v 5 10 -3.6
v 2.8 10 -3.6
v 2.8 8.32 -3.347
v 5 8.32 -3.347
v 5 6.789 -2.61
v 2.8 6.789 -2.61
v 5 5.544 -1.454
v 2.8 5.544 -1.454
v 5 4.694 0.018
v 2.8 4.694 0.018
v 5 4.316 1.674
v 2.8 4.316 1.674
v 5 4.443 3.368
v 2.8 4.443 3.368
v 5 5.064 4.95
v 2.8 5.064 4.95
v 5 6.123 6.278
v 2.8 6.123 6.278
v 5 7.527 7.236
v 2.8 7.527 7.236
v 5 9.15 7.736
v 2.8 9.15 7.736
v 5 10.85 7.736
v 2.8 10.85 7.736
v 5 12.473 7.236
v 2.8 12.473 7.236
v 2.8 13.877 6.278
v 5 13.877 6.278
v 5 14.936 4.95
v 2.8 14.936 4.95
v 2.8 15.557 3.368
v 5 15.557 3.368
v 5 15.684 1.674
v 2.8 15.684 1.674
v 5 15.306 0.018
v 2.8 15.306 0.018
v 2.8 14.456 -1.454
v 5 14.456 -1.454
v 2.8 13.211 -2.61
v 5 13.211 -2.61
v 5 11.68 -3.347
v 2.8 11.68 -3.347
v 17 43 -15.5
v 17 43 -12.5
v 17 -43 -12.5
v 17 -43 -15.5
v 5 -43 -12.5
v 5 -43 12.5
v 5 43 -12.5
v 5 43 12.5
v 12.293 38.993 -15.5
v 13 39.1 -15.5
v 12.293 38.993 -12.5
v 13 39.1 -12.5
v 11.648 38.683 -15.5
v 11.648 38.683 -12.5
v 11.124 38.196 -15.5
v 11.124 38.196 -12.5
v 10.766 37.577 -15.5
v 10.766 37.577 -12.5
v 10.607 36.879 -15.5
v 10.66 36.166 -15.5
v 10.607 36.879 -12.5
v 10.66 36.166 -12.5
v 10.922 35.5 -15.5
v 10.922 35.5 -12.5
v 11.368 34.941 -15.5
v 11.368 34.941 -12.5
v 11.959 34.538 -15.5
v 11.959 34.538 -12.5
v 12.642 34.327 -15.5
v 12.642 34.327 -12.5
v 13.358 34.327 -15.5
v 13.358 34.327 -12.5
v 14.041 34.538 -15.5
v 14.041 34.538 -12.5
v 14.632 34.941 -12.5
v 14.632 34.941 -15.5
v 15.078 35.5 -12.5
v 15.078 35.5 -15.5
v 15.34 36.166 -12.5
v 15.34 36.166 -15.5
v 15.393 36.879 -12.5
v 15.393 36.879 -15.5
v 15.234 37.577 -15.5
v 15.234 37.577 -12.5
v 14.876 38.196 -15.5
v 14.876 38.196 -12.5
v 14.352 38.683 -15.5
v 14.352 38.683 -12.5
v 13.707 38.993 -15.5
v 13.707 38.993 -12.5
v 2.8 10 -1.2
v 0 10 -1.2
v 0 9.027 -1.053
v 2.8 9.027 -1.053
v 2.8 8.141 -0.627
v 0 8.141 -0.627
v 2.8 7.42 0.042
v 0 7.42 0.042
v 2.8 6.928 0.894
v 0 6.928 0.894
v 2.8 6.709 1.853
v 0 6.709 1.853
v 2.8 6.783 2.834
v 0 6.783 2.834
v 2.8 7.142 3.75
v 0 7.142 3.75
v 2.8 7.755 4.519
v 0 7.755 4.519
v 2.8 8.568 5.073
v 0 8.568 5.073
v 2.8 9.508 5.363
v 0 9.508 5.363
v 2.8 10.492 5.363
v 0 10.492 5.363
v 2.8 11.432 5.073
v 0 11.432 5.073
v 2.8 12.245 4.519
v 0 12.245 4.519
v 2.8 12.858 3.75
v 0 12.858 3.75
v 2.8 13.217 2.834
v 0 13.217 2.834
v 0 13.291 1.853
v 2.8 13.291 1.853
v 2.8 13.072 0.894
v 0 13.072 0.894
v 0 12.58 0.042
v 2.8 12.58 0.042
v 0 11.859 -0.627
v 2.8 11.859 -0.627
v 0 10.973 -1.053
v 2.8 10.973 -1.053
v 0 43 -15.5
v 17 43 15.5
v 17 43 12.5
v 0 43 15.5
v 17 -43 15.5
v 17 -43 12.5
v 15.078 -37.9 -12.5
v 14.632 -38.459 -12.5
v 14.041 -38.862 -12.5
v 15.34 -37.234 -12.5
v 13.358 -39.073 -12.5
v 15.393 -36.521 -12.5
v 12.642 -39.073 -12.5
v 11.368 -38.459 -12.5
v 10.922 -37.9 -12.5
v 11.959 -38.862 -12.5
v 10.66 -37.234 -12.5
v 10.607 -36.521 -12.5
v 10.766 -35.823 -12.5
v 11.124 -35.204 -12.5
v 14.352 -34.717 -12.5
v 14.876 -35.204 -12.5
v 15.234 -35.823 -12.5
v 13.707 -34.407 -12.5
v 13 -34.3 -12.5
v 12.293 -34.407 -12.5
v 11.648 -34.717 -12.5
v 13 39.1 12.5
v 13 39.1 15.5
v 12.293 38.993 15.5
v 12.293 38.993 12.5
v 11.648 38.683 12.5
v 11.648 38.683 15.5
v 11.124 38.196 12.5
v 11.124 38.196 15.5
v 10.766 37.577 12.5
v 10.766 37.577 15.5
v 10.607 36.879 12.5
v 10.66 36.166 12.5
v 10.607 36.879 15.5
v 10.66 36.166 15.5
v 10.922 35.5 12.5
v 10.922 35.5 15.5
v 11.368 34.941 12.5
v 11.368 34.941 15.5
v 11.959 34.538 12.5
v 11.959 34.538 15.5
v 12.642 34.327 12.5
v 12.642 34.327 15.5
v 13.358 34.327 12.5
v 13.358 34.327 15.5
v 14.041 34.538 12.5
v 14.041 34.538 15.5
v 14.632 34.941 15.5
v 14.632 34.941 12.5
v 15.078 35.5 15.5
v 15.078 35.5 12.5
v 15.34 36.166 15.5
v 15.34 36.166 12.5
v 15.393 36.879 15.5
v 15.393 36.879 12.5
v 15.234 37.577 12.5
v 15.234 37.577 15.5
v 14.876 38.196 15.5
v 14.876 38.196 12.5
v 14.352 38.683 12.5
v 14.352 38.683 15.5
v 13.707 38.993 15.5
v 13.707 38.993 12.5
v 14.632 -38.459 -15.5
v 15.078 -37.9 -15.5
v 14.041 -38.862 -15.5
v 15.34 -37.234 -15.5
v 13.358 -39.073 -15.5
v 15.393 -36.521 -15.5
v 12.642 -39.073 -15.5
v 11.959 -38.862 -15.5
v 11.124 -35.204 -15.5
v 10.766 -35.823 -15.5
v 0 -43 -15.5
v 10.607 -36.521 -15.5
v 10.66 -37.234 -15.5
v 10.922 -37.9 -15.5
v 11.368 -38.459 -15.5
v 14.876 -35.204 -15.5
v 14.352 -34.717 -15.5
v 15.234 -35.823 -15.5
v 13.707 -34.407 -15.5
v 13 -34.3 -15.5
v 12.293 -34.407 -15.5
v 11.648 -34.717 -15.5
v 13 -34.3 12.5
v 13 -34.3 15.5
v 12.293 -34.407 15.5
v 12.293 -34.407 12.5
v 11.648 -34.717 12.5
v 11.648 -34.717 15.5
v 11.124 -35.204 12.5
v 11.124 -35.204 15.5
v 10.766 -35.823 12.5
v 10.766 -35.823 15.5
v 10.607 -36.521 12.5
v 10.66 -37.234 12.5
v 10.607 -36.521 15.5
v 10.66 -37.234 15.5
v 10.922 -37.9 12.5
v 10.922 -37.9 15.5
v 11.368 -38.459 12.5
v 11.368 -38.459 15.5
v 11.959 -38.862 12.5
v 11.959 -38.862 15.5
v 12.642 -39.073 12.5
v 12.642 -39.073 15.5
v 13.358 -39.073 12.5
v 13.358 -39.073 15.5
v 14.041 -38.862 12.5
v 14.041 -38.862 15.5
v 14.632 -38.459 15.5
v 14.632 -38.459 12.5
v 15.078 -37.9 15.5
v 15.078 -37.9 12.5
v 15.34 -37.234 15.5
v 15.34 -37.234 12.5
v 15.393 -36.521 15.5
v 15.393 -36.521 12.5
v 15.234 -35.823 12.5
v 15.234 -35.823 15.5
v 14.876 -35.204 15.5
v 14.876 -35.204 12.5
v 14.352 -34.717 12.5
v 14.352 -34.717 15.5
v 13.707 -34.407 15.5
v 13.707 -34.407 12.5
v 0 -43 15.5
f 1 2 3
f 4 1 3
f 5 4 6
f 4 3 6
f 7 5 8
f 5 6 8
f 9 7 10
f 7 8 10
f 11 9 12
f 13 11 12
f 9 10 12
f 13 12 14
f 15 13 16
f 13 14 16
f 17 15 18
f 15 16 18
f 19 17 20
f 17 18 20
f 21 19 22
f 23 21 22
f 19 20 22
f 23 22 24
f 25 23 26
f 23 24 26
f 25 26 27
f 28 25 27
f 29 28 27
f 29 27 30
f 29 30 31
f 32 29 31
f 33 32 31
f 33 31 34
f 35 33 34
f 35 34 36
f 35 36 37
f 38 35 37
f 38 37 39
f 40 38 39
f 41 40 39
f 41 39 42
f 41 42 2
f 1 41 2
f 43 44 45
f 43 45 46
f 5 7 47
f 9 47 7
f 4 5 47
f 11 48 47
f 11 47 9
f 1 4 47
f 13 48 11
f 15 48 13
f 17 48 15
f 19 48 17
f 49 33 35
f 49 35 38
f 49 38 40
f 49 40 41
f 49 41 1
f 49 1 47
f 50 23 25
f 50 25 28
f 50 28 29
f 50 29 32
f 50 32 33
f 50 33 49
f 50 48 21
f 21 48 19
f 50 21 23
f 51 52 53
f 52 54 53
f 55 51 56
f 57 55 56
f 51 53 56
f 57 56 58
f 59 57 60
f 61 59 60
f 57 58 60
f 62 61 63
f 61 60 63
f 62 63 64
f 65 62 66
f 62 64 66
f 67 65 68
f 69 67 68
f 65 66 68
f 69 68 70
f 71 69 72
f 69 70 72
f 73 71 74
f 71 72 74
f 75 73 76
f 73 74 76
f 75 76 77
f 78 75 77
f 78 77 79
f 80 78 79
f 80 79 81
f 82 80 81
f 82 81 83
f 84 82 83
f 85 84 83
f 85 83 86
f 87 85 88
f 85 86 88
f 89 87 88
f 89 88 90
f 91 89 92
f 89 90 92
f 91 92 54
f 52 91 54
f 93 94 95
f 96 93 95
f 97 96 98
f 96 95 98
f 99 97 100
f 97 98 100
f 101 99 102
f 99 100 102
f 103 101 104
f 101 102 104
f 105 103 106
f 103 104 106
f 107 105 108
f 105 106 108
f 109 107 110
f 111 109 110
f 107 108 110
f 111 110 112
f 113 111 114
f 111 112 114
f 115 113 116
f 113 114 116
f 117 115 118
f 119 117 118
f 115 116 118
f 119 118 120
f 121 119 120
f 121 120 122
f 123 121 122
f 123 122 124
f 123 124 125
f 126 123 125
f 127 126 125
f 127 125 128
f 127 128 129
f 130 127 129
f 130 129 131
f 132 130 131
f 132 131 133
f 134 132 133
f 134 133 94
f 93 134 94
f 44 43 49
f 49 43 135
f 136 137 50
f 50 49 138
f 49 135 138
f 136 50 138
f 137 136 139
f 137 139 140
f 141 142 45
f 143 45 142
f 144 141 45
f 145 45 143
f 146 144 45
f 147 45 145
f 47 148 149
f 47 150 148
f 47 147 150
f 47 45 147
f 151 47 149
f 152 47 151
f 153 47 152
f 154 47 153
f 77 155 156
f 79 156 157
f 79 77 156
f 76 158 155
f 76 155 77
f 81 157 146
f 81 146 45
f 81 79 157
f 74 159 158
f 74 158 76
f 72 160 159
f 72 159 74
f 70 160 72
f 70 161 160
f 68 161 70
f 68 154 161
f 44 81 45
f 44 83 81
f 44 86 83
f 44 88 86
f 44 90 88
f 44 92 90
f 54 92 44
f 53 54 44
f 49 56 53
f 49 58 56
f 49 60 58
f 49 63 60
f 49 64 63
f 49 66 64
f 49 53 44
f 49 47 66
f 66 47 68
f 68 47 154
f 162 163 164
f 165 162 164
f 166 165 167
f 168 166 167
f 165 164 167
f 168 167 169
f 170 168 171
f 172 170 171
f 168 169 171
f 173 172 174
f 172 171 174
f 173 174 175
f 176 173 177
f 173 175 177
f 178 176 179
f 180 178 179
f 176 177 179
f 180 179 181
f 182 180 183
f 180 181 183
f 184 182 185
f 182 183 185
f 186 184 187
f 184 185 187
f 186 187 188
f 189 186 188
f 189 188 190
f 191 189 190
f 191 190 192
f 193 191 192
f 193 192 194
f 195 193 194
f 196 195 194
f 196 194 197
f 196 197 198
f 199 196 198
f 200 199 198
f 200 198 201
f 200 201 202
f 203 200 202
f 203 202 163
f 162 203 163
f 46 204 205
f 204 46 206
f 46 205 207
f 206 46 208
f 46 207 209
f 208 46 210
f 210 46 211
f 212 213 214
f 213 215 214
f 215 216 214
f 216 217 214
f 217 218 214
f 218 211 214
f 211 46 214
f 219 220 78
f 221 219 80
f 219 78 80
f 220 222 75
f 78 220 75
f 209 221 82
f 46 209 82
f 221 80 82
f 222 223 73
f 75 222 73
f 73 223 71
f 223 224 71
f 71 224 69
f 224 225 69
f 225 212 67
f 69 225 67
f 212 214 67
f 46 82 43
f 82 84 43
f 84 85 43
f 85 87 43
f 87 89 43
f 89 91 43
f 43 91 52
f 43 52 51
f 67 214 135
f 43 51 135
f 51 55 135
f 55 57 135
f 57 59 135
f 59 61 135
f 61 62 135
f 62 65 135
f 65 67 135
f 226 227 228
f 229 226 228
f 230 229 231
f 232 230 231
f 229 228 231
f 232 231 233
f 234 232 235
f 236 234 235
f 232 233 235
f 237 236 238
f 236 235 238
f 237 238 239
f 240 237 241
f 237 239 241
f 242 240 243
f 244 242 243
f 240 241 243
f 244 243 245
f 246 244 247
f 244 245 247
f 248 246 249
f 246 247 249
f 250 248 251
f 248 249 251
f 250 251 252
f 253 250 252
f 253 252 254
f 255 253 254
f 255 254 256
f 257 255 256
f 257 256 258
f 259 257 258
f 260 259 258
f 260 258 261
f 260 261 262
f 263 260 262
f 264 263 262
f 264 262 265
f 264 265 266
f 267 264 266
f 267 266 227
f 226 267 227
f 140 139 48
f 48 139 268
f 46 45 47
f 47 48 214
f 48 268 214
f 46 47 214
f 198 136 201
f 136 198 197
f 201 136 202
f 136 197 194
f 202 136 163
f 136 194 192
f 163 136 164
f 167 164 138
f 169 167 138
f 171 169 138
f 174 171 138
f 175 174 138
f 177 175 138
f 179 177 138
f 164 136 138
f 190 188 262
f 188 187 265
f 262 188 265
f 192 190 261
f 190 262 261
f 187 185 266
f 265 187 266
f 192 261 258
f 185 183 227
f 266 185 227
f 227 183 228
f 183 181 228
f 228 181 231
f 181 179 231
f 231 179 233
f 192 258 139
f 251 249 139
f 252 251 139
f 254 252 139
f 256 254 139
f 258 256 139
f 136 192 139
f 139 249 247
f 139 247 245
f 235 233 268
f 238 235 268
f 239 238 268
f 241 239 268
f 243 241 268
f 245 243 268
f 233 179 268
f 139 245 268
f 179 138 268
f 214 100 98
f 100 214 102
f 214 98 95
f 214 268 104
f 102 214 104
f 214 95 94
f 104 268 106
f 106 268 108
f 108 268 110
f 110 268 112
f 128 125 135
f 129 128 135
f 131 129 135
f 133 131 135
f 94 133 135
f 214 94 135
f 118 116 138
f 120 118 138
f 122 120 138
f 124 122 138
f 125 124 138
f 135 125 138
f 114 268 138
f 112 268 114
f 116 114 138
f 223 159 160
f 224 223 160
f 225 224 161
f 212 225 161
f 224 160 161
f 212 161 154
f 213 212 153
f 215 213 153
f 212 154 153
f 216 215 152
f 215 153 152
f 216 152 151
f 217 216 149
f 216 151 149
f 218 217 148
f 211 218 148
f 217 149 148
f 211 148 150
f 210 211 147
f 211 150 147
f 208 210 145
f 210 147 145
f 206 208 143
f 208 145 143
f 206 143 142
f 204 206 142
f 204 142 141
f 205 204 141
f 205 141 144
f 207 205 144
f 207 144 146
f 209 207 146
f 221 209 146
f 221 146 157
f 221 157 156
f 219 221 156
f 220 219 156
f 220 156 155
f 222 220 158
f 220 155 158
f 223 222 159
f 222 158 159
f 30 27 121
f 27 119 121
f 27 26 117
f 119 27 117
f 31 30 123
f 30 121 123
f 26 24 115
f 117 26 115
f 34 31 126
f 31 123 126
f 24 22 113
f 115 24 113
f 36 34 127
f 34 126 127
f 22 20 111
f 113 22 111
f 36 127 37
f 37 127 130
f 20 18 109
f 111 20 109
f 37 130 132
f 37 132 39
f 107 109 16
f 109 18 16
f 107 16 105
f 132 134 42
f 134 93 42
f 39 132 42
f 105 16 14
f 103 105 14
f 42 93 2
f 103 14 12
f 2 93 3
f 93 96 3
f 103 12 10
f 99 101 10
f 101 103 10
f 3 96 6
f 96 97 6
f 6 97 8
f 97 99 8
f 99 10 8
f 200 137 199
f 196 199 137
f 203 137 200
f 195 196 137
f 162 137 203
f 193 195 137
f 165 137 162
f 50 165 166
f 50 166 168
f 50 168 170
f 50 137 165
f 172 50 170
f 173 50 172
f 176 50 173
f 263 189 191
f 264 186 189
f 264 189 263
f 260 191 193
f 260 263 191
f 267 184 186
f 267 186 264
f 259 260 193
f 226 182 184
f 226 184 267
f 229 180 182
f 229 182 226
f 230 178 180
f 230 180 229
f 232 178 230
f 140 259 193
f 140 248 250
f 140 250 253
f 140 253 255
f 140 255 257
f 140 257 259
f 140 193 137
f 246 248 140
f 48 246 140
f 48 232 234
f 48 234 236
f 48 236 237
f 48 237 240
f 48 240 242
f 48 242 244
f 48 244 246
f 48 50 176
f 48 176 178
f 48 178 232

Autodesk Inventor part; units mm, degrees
ref_plane "YZ Plane" through (0, 0, 0) normal (1, 0, 0) x (0, 1, 0)
ref_plane "XZ Plane" through (0, 0, 0) normal (0, 1, 0) x (-1, 0, 0)
ref_plane "XY Plane" through (0, 0, 0) normal (0, 0, 1) x (1, 0, 0)
sketch "Sketch1" plane through (0, 0, 0) normal (1, 0, 0) x (0, 1, 0)
  line L0 (43, 15.5) -> (-43, 15.5)
  line L1 (-43, 15.5) -> (-43, -15.5)
  line L2 (-43, -15.5) -> (43, -15.5)
  line L3 (43, -15.5) -> (43, 15.5)
  point P0 (0, 0)
  point P1 (0, -15.5)
  point P2 (43, 0)
  dimension "d0" = 86
  dimension "d1" = 31
extrude "Extrusion1" add sketch "Sketch1" along normal blind 5
sketch "Sketch2" plane through (5, 0, 0) normal (1, 0, 0) x (0, 0, -1)
  line L0 (-15.5, 43) -> (-12.5, 43)
  line L1 (-12.5, 43) -> (-12.5, -43)
  line L2 (-12.5, -43) -> (-15.5, -43)
  line L3 (-15.5, -43) -> (-15.5, 43)
  line L4 (12.5, 43) -> (15.5, 43)
  line L5 (15.5, 43) -> (15.5, -43)
  line L6 (15.5, -43) -> (12.5, -43)
  line L7 (12.5, -43) -> (12.5, 43)
  point P0 (0, 0)
  dimension "d4" = 3
  dimension "d5" = 3
extrude "Extrusion2" add sketch "Sketch2" along normal blind 12
sketch "Sketch3" plane through (0, -43, -15.5) normal (0, 0, -1) x (-1, 0, 0)
  line L0 (0, 86) -> (-17, 86) construction
  line L1 (-5, 0) -> (-5, 86) construction
  line L2 (-35.4485, 43) -> (35.4485, 43) construction
  line L3 (0, 0) -> (0, 86) construction
  point P0 (0, 43)
  point P1 (-13, 79.7)
  point P2 (0, 43)
  point P3 (-13, 6.3)
  dimension "d8" = 6.3
  dimension "d9" = 8
hole "Hole1" at (13, 36.7, -15.5) at (13, -36.7, -15.5) direction (0, 0, 1) diameter 4.8 end through all
sketch "Sketch4" plane through (5, 0, 0) normal (1, 0, 0) x (0, 0, -1)
  line L0 (-15.5, 43) -> (-15.5, -43) projected
  point P0 (0, 0)
  point P1 (-2.1, 10)
  dimension "d25" = 13.4
  dimension "d26" = 10
hole "Hole2" at (5, 10, 2.1) direction (-1, 0, 0) diameter 6.6 depth 5 counterbore diameter 11.4 counterbore depth 2.2 clearance for "Countersunk Flat Head Screw ISO 2009/7046" size "M6" standard "ISO"
properties part number "TH_fan_holder"
